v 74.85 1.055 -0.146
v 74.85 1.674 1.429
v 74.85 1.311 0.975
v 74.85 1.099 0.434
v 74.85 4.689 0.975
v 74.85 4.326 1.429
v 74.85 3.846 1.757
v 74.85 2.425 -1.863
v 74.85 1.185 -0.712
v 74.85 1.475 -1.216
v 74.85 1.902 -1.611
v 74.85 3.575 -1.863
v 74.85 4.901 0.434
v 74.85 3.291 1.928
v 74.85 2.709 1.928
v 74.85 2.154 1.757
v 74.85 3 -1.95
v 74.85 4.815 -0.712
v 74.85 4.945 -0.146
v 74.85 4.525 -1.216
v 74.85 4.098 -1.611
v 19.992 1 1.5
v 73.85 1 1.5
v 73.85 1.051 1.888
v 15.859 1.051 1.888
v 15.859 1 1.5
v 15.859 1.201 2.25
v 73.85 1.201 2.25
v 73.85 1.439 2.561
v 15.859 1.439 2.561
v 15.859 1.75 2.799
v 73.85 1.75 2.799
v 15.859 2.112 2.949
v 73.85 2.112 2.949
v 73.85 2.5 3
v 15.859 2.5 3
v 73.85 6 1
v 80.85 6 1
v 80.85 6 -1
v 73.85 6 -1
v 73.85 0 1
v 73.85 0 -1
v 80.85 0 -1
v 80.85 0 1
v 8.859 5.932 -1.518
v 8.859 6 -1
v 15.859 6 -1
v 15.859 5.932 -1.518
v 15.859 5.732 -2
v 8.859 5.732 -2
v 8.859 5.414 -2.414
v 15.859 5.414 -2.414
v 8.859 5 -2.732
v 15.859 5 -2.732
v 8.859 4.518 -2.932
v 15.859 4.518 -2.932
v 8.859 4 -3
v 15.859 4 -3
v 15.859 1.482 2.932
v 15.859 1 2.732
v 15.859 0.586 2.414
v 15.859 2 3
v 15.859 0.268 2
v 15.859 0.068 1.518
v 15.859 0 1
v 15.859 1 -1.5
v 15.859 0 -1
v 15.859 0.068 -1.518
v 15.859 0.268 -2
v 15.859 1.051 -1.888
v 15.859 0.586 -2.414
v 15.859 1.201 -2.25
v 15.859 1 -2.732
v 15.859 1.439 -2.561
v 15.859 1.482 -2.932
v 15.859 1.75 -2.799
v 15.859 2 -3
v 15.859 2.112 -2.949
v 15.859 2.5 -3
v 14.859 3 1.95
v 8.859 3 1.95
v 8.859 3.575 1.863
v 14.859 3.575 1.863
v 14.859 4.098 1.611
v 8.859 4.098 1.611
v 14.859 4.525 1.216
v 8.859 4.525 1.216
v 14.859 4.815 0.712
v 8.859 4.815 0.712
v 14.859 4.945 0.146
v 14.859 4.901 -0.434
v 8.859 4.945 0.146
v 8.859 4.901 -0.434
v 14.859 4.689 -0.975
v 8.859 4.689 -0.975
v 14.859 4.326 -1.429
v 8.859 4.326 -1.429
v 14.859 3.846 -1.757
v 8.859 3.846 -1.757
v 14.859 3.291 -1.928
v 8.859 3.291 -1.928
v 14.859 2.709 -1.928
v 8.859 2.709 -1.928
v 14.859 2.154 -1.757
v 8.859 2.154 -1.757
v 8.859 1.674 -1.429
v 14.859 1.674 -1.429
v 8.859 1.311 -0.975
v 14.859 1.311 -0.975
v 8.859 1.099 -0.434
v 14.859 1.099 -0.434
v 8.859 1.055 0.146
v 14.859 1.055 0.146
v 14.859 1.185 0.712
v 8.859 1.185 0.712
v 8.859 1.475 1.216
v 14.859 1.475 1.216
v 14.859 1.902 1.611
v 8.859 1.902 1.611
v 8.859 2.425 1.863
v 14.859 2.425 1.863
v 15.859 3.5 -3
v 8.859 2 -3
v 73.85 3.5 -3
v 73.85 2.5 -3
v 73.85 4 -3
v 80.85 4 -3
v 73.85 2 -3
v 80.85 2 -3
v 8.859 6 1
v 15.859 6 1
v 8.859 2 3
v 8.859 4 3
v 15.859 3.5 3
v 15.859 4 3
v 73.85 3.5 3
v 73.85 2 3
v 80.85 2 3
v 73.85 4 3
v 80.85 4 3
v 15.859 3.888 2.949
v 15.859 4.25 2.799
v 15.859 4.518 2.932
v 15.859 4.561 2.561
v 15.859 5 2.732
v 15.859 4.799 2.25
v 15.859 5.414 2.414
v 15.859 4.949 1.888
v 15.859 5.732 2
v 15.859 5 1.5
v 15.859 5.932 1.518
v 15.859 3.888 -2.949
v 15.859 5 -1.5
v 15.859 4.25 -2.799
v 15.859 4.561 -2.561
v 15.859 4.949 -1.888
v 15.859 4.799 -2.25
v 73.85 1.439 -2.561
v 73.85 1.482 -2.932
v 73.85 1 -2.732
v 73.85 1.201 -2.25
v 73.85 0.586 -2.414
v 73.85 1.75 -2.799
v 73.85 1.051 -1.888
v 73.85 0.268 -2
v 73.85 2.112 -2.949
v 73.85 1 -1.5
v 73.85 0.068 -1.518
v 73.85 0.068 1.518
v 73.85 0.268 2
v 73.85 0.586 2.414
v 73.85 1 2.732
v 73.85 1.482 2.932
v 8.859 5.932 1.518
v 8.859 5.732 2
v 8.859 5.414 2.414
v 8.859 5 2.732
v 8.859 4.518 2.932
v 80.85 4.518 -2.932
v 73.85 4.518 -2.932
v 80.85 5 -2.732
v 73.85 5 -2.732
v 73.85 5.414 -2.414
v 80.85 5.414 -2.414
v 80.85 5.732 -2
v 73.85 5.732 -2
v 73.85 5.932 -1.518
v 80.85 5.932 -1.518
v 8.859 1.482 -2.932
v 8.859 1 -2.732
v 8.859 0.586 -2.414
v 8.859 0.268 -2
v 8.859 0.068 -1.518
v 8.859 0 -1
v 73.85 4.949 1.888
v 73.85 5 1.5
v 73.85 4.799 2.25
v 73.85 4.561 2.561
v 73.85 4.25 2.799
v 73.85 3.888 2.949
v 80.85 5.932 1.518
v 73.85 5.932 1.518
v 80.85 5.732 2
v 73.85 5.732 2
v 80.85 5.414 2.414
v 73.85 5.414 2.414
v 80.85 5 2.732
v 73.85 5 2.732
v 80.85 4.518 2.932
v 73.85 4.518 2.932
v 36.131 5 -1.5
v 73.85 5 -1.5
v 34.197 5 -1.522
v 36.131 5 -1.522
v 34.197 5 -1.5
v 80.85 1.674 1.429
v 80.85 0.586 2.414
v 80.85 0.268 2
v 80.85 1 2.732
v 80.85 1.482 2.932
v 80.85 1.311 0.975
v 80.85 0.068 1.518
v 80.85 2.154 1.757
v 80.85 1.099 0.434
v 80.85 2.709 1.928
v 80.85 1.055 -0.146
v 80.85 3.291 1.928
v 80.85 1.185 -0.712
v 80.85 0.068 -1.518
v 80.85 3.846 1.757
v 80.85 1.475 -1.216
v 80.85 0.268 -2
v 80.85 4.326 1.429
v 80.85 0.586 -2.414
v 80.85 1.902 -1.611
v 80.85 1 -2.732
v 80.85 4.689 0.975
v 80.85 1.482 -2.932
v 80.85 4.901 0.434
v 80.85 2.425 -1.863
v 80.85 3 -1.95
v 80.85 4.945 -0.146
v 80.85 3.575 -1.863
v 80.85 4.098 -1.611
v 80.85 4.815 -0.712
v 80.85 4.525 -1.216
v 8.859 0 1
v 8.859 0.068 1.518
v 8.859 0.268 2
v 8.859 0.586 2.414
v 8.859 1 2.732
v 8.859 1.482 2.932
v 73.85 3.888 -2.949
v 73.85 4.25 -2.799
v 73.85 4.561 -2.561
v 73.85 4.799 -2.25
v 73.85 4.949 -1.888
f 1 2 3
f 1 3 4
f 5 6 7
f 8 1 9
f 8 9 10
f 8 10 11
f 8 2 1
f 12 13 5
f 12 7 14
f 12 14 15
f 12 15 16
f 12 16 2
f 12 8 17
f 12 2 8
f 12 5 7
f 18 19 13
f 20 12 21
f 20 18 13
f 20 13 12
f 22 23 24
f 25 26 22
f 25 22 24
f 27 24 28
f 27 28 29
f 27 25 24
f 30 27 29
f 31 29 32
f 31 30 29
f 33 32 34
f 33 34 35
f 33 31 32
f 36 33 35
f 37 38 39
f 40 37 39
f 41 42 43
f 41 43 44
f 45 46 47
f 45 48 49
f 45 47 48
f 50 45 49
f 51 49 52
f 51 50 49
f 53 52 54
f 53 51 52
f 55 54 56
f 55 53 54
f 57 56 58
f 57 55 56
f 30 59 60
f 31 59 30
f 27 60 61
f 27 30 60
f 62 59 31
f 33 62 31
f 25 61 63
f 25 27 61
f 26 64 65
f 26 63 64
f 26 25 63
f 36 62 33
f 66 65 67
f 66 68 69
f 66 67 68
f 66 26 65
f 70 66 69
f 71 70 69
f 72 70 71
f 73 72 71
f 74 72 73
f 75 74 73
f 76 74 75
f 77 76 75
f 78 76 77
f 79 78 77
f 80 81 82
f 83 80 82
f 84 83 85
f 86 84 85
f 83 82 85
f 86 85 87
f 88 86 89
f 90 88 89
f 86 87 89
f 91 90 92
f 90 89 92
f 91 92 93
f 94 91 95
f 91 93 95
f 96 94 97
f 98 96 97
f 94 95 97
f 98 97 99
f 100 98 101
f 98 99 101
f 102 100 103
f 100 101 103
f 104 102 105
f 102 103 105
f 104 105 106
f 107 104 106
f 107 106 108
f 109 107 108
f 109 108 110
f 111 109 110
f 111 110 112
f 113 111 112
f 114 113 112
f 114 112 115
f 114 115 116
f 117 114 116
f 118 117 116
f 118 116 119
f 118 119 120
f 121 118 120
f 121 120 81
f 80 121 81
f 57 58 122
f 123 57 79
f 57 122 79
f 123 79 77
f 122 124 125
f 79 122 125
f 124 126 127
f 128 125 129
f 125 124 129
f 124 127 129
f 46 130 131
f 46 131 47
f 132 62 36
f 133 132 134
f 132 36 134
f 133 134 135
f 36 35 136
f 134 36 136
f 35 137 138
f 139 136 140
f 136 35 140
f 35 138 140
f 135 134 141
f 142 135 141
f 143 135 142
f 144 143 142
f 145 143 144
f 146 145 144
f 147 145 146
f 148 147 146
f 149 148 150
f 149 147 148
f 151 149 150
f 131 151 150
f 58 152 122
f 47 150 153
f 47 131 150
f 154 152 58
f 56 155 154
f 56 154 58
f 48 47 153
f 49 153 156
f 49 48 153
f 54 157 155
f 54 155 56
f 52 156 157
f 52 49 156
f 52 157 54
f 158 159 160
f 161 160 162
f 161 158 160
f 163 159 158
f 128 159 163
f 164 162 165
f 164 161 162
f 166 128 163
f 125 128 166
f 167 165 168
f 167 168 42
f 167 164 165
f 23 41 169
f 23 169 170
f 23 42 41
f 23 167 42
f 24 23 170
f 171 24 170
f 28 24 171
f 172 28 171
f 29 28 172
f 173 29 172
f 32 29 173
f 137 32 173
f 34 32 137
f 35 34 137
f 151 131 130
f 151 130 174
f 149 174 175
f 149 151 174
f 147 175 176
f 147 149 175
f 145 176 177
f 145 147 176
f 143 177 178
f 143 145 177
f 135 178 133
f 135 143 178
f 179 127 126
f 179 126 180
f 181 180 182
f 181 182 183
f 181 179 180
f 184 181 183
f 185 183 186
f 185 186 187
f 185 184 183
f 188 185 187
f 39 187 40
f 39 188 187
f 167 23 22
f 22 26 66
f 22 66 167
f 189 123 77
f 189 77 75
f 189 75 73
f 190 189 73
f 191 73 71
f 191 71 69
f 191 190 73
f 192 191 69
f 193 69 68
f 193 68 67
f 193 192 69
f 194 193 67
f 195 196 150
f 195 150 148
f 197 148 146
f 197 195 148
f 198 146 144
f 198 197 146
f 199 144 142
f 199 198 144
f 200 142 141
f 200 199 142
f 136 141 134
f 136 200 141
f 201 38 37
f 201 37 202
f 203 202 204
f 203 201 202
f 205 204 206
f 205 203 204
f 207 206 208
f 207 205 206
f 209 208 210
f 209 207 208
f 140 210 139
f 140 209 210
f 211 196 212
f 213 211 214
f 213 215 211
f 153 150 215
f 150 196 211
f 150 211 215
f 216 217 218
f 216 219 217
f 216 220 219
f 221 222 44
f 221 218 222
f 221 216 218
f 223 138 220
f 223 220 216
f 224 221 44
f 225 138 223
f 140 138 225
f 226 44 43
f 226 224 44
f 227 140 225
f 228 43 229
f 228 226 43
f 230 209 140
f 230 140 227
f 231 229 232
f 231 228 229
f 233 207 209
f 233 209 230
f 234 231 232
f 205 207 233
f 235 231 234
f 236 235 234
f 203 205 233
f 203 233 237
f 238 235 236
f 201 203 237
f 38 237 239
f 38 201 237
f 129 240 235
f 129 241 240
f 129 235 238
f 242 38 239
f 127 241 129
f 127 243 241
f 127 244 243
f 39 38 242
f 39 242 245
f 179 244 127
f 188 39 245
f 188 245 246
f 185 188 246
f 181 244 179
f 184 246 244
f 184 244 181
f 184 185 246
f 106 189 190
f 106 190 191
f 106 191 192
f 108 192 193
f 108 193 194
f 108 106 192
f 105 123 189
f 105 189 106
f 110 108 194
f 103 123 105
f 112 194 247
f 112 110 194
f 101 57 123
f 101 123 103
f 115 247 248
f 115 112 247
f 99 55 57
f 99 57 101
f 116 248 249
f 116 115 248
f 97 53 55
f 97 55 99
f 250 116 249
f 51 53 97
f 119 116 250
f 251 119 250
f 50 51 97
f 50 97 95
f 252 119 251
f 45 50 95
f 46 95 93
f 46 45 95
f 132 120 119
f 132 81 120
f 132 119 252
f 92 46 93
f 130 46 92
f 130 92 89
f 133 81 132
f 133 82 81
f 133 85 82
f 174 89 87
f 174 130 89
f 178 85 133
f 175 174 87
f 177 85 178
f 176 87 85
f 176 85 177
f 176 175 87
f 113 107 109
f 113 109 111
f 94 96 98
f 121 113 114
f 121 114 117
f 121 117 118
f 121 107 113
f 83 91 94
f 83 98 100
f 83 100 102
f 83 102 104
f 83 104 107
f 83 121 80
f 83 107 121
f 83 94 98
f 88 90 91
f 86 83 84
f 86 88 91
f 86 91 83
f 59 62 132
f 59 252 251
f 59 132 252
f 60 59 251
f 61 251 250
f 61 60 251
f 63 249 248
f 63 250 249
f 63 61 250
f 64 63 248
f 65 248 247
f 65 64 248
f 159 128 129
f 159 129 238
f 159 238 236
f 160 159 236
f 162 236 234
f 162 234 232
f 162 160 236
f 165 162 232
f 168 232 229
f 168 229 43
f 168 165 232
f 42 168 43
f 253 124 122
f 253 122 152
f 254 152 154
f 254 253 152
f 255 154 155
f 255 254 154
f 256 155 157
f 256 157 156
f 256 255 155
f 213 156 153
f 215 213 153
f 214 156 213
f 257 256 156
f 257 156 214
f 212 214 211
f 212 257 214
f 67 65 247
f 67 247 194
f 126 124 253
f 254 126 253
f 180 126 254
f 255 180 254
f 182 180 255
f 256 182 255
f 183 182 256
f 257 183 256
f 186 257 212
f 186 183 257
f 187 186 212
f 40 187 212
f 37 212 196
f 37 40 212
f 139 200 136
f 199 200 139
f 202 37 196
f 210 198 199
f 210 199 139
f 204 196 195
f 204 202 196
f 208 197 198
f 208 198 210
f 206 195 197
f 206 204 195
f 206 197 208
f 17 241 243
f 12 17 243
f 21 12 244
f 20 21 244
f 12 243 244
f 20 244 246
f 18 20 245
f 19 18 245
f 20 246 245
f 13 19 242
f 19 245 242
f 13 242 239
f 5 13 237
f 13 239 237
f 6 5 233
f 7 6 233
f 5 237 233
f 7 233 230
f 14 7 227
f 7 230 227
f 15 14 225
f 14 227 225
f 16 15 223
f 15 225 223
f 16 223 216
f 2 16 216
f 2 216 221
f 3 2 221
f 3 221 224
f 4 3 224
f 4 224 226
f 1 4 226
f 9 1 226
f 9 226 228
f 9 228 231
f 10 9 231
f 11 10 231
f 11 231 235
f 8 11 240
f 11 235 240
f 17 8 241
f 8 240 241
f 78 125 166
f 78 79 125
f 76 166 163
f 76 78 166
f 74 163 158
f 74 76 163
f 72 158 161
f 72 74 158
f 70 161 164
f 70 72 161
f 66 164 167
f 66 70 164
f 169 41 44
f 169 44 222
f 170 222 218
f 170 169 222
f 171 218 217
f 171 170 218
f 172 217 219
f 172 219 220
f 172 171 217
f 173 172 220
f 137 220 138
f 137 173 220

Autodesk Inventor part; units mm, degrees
ref_plane "YZ Plane" through (0, 0, 0) normal (1, 0, 0) x (0, 1, 0)
ref_plane "XZ Plane" through (0, 0, 0) normal (0, 1, 0) x (-1, 0, 0)
ref_plane "XY Plane" through (0, 0, 0) normal (0, 0, 1) x (1, 0, 0)
sketch "Sketch1" plane through (0, 0, 0) normal (0, 1, 0) x (-1, 0, 0)
  point P0 (0, 0)
sketch "Sketch2" plane through (0, 0, 0) normal (0, 1, 0) x (-1, 0, 0)
  circle A0 centre (0, 0) radius 3.85
  dimension "d0" = 7.7
extrude "Extrusion1" add sketch "Sketch2" along normal blind 6
sketch "Sketch3" plane through (0, 6, 0) normal (0, 1, 0) x (1, 0, 0)
  circle A0 centre (0, 0) radius 1
  dimension "d3" = 2
extrude "Extrusion2" cut sketch "Sketch3" against normal through all
sketch "Sketch4" plane through (0, 0, 0) normal (0, -1, 0) x (1, 0, 0)
  circle A0 centre (0, 0) radius 3.85 projected
  line L0 (0, 3.85) -> (3.85, 3.85)
  line L1 (3.85, 3.85) -> (3.85, -3.85)
  line L2 (3.85, -3.85) -> (0, -3.85)
  line L3 (3.85, 3.85) -> (4.85, 3.85)
  line L4 (4.85, 3.85) -> (4.85, -3.85)
  line L5 (4.85, -3.85) -> (3.85, -3.85)
  line L6 (3.85, -3.85) -> (3.85, 3.85)
  line L7 (4.85, 3.85) -> (4.85, 3)
  line L8 (4.85, -3.85) -> (4.85, -3)
  line L9 (4.85, 3) -> (3.85, 3)
  line L10 (3.85, 3) -> (3.85, -3)
  line L11 (3.85, -3) -> (4.85, -3)
  line L12 (4.85, -3) -> (4.85, 3)
  point P0 (3.85, -3)
  dimension "d6" = 1
  dimension "d7" = 0.85
  dimension "d8" = 0.85
extrude "Extrusion3" add sketch "Sketch4" against normal blind 6 contours L1 L9 L4 L11
sketch "Sketch5" plane through (4.85, 0, 3) normal (1, 0, 0) x (0, 0, -1)
  line L0 (6.85, 0) -> (-0.85, 0) projected
  line L1 (6, 0) -> (6, 6) projected
  line L2 (0.0003, 0) -> (6, 0)
  line L3 (6, 0) -> (6, 1)
  line L4 (6, 1) -> (0.0003, 1)
  line L5 (0.0003, 1) -> (0.0003, 0)
  line L6 (6.85, 6) -> (-0.85, 6) projected
  line L7 (0.0003, 6) -> (6, 6)
  line L8 (6, 6) -> (6, 5)
  line L9 (6, 5) -> (0.0003, 5)
  line L10 (0.0003, 5) -> (0.0003, 6)
  point P0 (3, 0)
  point P1 (3, 6)
  dimension "d11" = 1
  dimension "d12" = 1
extrude "Extrusion4" cut sketch "Sketch5" against normal blind 1 contours L9 L10 L6 L1
extrude "Extrusion5" cut sketch "Sketch5" against normal blind 1 contours L0 L5 L4 L1
sketch "Sketch6" plane through (4.85, 5, 2.9997) normal (0, 0, -1) x (-1, 0, 0)
  line L0 (0, 0) -> (1, 0) projected
  line L1 (0, -5) -> (0, 1) projected
  line L2 (1, 0) -> (0, 0)
  line L3 (0, 0) -> (0, 1)
  line L4 (0, 1) -> (1, 1)
  line L5 (1, 1) -> (1, 0)
  line L6 (1, -5) -> (0, -5)
  line L7 (0, -5) -> (0, -3.9916)
  line L8 (0, -3.9916) -> (1, -3.9916)
  line L9 (1, -3.9916) -> (1, -5)
  point P0 (4.85, -5)
extrude "Extrusion6" cut sketch "Sketch6" against normal through all contours L1 L4 L5 L0
extrude "Extrusion7" cut sketch "Sketch6" against normal through all contours L1 L8 L9 L6
sketch "Sketch7" plane through (4.85, 5, 3) normal (1, 0, 0) x (0, 0, -1)
  line L0 (0, 0) -> (3, 0) projected
  line L1 (6, -4) -> (6, 0) projected
  line L2 (0, 0) -> (6, 0)
  line L3 (6, 0) -> (6, -4)
  line L4 (6, -4) -> (0, -4)
  line L5 (0, -4) -> (0, 0)
  point P0 (3, -5)
extrude "Extrusion8" add sketch "Sketch7" along normal blind 71
sketch "Sketch8" plane through (3.85, 1, -3) normal (0, 0, -1) x (-1, 0, 0)
  point P0 (3.85, -1)
sketch "Sketch9" plane through (3.85, 5, 0) normal (0, 1, 0) x (1, 0, 0)
  line L0 (72, 3) -> (72, -3) projected
  line L1 (72, 0) -> (75.85, 0)
  circle A0 centre (75.85, 0) radius 3.85
  point P0 (-3.85, 0)
  dimension "d23" = 3.85
extrude "Extrusion9" add sketch "Sketch9" along normal blind 1
extrude "Extrusion10" add sketch "Sketch9" against normal blind 5
sketch "Sketch10" plane through (79.7, 6, 0) normal (0, 1, 0) x (1, 0, 0)
  circle A0 centre (0, 0) radius 1.85
  point P0 (-79.7, 0)
  dimension "d28" = 3.7
extrude "Extrusion11" cut sketch "Sketch10" against normal through all
sketch "Sketch11" plane through (3.85, 5, 0) normal (-1, 0, 0) x (0, 0, 1)
  point P0 (0, -5)
sketch "Sketch12" plane through (3.85, 5, -3) normal (-1, 0, 0) x (0, 0, 1)
  line L0 (0, 0) -> (3, 0) projected
  line L1 (6, 0) -> (6, -4) projected
  line L2 (0, 0) -> (6, 0)
  line L3 (6, 0) -> (6, -4)
  line L4 (6, -4) -> (0, -4)
  line L5 (0, -4) -> (0, 0)
  point P0 (3, -5)
extrude "Extrusion12" add sketch "Sketch12" along normal blind 2
sketch "Sketch13" plane through (75.85, 5, 3) normal (1, 0, 0) x (0, 0, -1)
  line L0 (3, 0) -> (0, 0) projected
  line L1 (3, -4) -> (6, -4) projected
  line L2 (0, 0) -> (6, 0)
  line L3 (6, 0) -> (6, -4)
  line L4 (6, -4) -> (0, -4)
  line L5 (0, -4) -> (0, 0)
  point P0 (3, -5)
extrude "Extrusion13" add sketch "Sketch13" along normal blind 1.6
fillet "Fillet1" radius 1.5 2 edges at (76.5685, 5, 3) (39.1315, 5, 3)
fillet "Fillet2" radius 1.5 1 edges at (39.85, 5, -3)
fillet "Fillet3" radius 1.5 1 edges at (39.85, 1, -3)
fillet "Fillet4" radius 1.5 3 edges at (4.35, 1, 2.9997) (40.35, 1, 3) (4.85, 1, 2.9998)
sketch "Sketch14" plane through (3.5458, 5, 1.5) normal (0, 1, 0) x (1, 0, 0)
  point P0 (-3.5458, 1.5)
sketch "Sketch15" plane through (3.5458, 5, 1.5) normal (0, 1, 0) x (1, 0, 0)
  line L0 (0.4177, 2.9988) -> (2.9717, 2.9988) construction
  line L1 (2.9717, 2.9988) -> (2.9717, -0.0492) construction
  line L2 (2.9717, -0.0492) -> (0.4177, -0.0492) construction
  line L3 (0.4177, -0.0492) -> (0.4177, 2.9988) construction
  line L4 (0.398, -0.0492) -> (1.4255, 2.9988)
  line L5 (1.4255, 2.9988) -> (1.9244, 2.9988)
  line L6 (1.9244, 2.9988) -> (2.952, -0.0492)
  line L7 (2.952, -0.0492) -> (2.5247, -0.0492)
  line L8 (2.5247, -0.0492) -> (2.248, 0.803)
  line L9 (2.248, 0.803) -> (1.0846, 0.803)
  line L10 (1.0846, 0.803) -> (0.808, -0.0492)
  line L11 (0.808, -0.0492) -> (0.398, -0.0492)
  line L12 (2.1369, 1.1488) -> (1.6651, 2.5839)
  line L13 (1.6651, 2.5839) -> (1.1958, 1.1488)
  line L14 (1.1958, 1.1488) -> (2.1369, 1.1488)
  point P0 (-3.5458, 1.5)
extrude "Extrusion14" add sketch "Sketch15" along normal blind 0.2
sketch "Sketch16" plane through (3.5458, 5, -1.5) normal (0, 1, 0) x (1, 0, 0)
  line L0 (69.8363, -0.0038) -> (72.3064, -0.0038) construction
  line L1 (72.3064, -0.0038) -> (72.3064, -3.0518) construction
  line L2 (72.3064, -3.0518) -> (69.8363, -3.0518) construction
  line L3 (69.8363, -3.0518) -> (69.8363, -0.0038) construction
  spline S0 degree 2 poles (72.2125, -2.1157) (72.2125, -2.3429) (72.0396, -2.6912) (71.8963, -2.8048) knots 0 0 0 1 2 2 2
  spline S1 degree 2 poles (71.8963, -2.8048) (71.7234, -2.9382) (71.3307, -3.0518) (71.0195, -3.0518) knots 0 0 0 1 2 2 2
  line L4 (71.0195, -3.0518) -> (70.1451, -3.0518)
  line L5 (70.1451, -3.0518) -> (70.1451, -0.0038)
  line L6 (70.1451, -0.0038) -> (70.9528, -0.0038)
  spline S2 degree 2 poles (70.9528, -0.0038) (71.2788, -0.0038) (71.6049, -0.0458) (71.7531, -0.1273) knots 0 0 0 1 2 2 2
  spline S3 degree 2 poles (71.7531, -0.1273) (71.9186, -0.2138) (72.0692, -0.4978) (72.0692, -0.6905) knots 0 0 0 1 2 2 2
  spline S4 degree 2 poles (72.0692, -0.6905) (72.0692, -0.9054) (71.842, -1.2462) (71.6419, -1.3426) knots 0 0 0 1 2 2 2
  line L7 (71.6419, -1.3426) -> (71.6419, -1.3574)
  spline S5 degree 2 poles (71.6419, -1.3574) (71.9136, -1.4315) (72.2125, -1.8242) (72.2125, -2.1157) knots 0 0 0 1 2 2 2
  spline S6 degree 2 poles (71.7901, -2.133) (71.7901, -1.9601) (71.6913, -1.7378) (71.5431, -1.6587) knots 0 0 0 1 2 2 2
  spline S7 degree 2 poles (71.5431, -1.6587) (71.4468, -1.6093) (71.2195, -1.5797) (71.0096, -1.5797) knots 0 0 0 1 2 2 2
  line L8 (71.0096, -1.5797) -> (70.5502, -1.5797)
  line L9 (70.5502, -1.5797) -> (70.5502, -2.706)
  line L10 (70.5502, -2.706) -> (70.8787, -2.706)
  spline S8 degree 2 poles (70.8787, -2.706) (71.1454, -2.706) (71.4517, -2.6566) (71.5703, -2.5776) knots 0 0 0 1 2 2 2
  spline S9 degree 2 poles (71.5703, -2.5776) (71.6839, -2.4961) (71.7901, -2.2935) (71.7901, -2.133) knots 0 0 0 1 2 2 2
  spline S10 degree 2 poles (71.6469, -0.7473) (71.6469, -0.6386) (71.5728, -0.4756) (71.4912, -0.4287) knots 0 0 0 1 2 2 2
  spline S11 degree 2 poles (71.4912, -0.4287) (71.3924, -0.3743) (71.1529, -0.3496) (70.938, -0.3496) knots 0 0 0 1 2 2 2
  line L11 (70.938, -0.3496) -> (70.5502, -0.3496)
  line L12 (70.5502, -0.3496) -> (70.5502, -1.2413)
  line L13 (70.5502, -1.2413) -> (71.0096, -1.2413)
  spline S12 degree 2 poles (71.0096, -1.2413) (71.1998, -1.2413) (71.3801, -1.2018) (71.4764, -1.14) knots 0 0 0 1 2 2 2
  spline S13 degree 2 poles (71.4764, -1.14) (71.5703, -1.0807) (71.6469, -0.8905) (71.6469, -0.7473) knots 0 0 0 1 2 2 2
  point P0 (-3.5458, -1.5)
extrude "Extrusion15" add sketch "Sketch16" along normal blind 0.2
sketch "Sketch17" plane through (3.5458, 5, -1.5) normal (0, 1, 0) x (1, 0, 0)
  line L0 (0.4145, -1.5) -> (36.4145, -1.5)
  line L1 (30.4487, 0.0859) -> (55.6072, 0.0859) construction
  line L2 (55.6072, 0.0859) -> (55.6072, -2.5363) construction
  line L3 (55.6072, -2.5363) -> (30.4487, -2.5363) construction
  line L4 (30.4487, -2.5363) -> (30.4487, 0.0859) construction
  line L5 (32.5853, -0.4353) -> (31.2663, -3.0264)
  line L6 (31.2663, -3.0264) -> (30.8316, -3.0264)
  line L7 (30.8316, -3.0264) -> (32.2247, -0.3365)
  line L8 (32.2247, -0.3365) -> (30.6513, -0.3365)
  line L9 (30.6513, -0.3365) -> (30.6513, 0.0216)
  line L10 (30.6513, 0.0216) -> (32.5853, 0.0216)
  line L11 (32.5853, 0.0216) -> (32.5853, -0.4353)
  line L12 (34.838, -3.0264) -> (32.9583, -3.0264)
  line L13 (32.9583, -3.0264) -> (32.9583, -2.5941)
  spline S0 degree 2 poles (32.9583, -2.5941) (33.1608, -2.4039) (33.5214, -2.0507) (33.6943, -1.8605) knots 0 0 0 1 2 2 2
  spline S1 degree 2 poles (33.6943, -1.8605) (34.0426, -1.4777) (34.297, -1.0182) (34.297, -0.7737) knots 0 0 0 1 2 2 2
  spline S2 degree 2 poles (34.297, -0.7737) (34.297, -0.6453) (34.218, -0.4526) (34.1464, -0.3909) knots 0 0 0 1 2 2 2
  spline S3 degree 2 poles (34.1464, -0.3909) (34.0747, -0.3291) (33.887, -0.2674) (33.7734, -0.2674) knots 0 0 0 1 2 2 2
  spline S4 degree 2 poles (33.7734, -0.2674) (33.6647, -0.2674) (33.4424, -0.3217) (33.3411, -0.3637) knots 0 0 0 1 2 2 2
  spline S5 degree 2 poles (33.3411, -0.3637) (33.2547, -0.3983) (33.0941, -0.4971) (33.0447, -0.5317) knots 0 0 0 1 2 2 2
  line L14 (33.0447, -0.5317) -> (33.0225, -0.5317)
  line L15 (33.0225, -0.5317) -> (33.0225, -0.0969)
  spline S6 degree 2 poles (33.0225, -0.0969) (33.1485, -0.0352) (33.6005, 0.0859) (33.803, 0.0859) knots 0 0 0 1 2 2 2
  spline S7 degree 2 poles (33.803, 0.0859) (34.2303, 0.0859) (34.712, -0.3662) (34.712, -0.7515) knots 0 0 0 1 2 2 2
  spline S8 degree 2 poles (34.712, -0.7515) (34.712, -0.9318) (34.628, -1.2331) (34.5539, -1.3616) knots 0 0 0 1 2 2 2
  spline S9 degree 2 poles (34.5539, -1.3616) (34.4798, -1.495) (34.2649, -1.7568) (34.1464, -1.8828) knots 0 0 0 1 2 2 2
  spline S10 degree 2 poles (34.1464, -1.8828) (33.9537, -2.0927) (33.4819, -2.5422) (33.3411, -2.6732) knots 0 0 0 1 2 2 2
  line L16 (33.3411, -2.6732) -> (34.838, -2.6732)
  line L17 (34.838, -2.6732) -> (34.838, -3.0264)
  line L18 (37.8958, -3.0264) -> (37.8958, -1.7024)
  spline S11 degree 2 poles (37.8958, -1.7024) (37.8958, -1.5444) (37.8711, -1.2751) (37.8316, -1.201) knots 0 0 0 1 2 2 2
  spline S12 degree 2 poles (37.8316, -1.201) (37.7921, -1.1195) (37.6414, -1.0405) (37.5105, -1.0405) knots 0 0 0 1 2 2 2
  spline S13 degree 2 poles (37.5105, -1.0405) (37.392, -1.0405) (37.1203, -1.1862) (36.977, -1.3245) knots 0 0 0 1 2 2 2
  spline S14 degree 2 poles (36.977, -1.3245) (36.9795, -1.3591) (36.9844, -1.4554) (36.9844, -1.5197) knots 0 0 0 1 2 2 2
  line L19 (36.9844, -1.5197) -> (36.9844, -3.0264)
  line L20 (36.9844, -3.0264) -> (36.5991, -3.0264)
  line L21 (36.5991, -3.0264) -> (36.5991, -1.7024)
  spline S15 degree 2 poles (36.5991, -1.7024) (36.5991, -1.5444) (36.5744, -1.2751) (36.5349, -1.201) knots 0 0 0 1 2 2 2
  spline S16 degree 2 poles (36.5349, -1.201) (36.4953, -1.1195) (36.3447, -1.0405) (36.2138, -1.0405) knots 0 0 0 1 2 2 2
  spline S17 degree 2 poles (36.2138, -1.0405) (36.0903, -1.0405) (35.8161, -1.1961) (35.6876, -1.3171) knots 0 0 0 1 2 2 2
  line L22 (35.6876, -1.3171) -> (35.6876, -3.0264)
  line L23 (35.6876, -3.0264) -> (35.3023, -3.0264)
  line L24 (35.3023, -3.0264) -> (35.3023, -0.7391)
  line L25 (35.3023, -0.7391) -> (35.6876, -0.7391)
  line L26 (35.6876, -0.7391) -> (35.6876, -0.9911)
  spline S18 degree 2 poles (35.6876, -0.9911) (35.8383, -0.8404) (36.1347, -0.6749) (36.3126, -0.6749) knots 0 0 0 1 2 2 2
  spline S19 degree 2 poles (36.3126, -0.6749) (36.5151, -0.6749) (36.8288, -0.8602) (36.9103, -1.0701) knots 0 0 0 1 2 2 2
  spline S20 degree 2 poles (36.9103, -1.0701) (37.0857, -0.875) (37.4167, -0.6749) (37.6093, -0.6749) knots 0 0 0 1 2 2 2
  spline S21 degree 2 poles (37.6093, -0.6749) (37.7575, -0.6749) (37.9996, -0.7663) (38.0885, -0.87) knots 0 0 0 1 2 2 2
  spline S22 degree 2 poles (38.0885, -0.87) (38.1799, -0.9738) (38.2812, -1.285) (38.2812, -1.5197) knots 0 0 0 1 2 2 2
  line L27 (38.2812, -1.5197) -> (38.2812, -3.0264)
  line L28 (38.2812, -3.0264) -> (37.8958, -3.0264)
  line L29 (41.4156, -3.0264) -> (41.4156, -1.7024)
  spline S23 degree 2 poles (41.4156, -1.7024) (41.4156, -1.5444) (41.3909, -1.2751) (41.3514, -1.201) knots 0 0 0 1 2 2 2
  spline S24 degree 2 poles (41.3514, -1.201) (41.3119, -1.1195) (41.1612, -1.0405) (41.0303, -1.0405) knots 0 0 0 1 2 2 2
  spline S25 degree 2 poles (41.0303, -1.0405) (40.9117, -1.0405) (40.64, -1.1862) (40.4968, -1.3245) knots 0 0 0 1 2 2 2
  spline S26 degree 2 poles (40.4968, -1.3245) (40.4992, -1.3591) (40.5042, -1.4554) (40.5042, -1.5197) knots 0 0 0 1 2 2 2
  line L30 (40.5042, -1.5197) -> (40.5042, -3.0264)
  line L31 (40.5042, -3.0264) -> (40.1189, -3.0264)
  line L32 (40.1189, -3.0264) -> (40.1189, -1.7024)
  spline S27 degree 2 poles (40.1189, -1.7024) (40.1189, -1.5444) (40.0942, -1.2751) (40.0546, -1.201) knots 0 0 0 1 2 2 2
  spline S28 degree 2 poles (40.0546, -1.201) (40.0151, -1.1195) (39.8644, -1.0405) (39.7335, -1.0405) knots 0 0 0 1 2 2 2
  spline S29 degree 2 poles (39.7335, -1.0405) (39.61, -1.0405) (39.3359, -1.1961) (39.2074, -1.3171) knots 0 0 0 1 2 2 2
  line L33 (39.2074, -1.3171) -> (39.2074, -3.0264)
  line L34 (39.2074, -3.0264) -> (38.8221, -3.0264)
  line L35 (38.8221, -3.0264) -> (38.8221, -0.7391)
  line L36 (38.8221, -0.7391) -> (39.2074, -0.7391)
  line L37 (39.2074, -0.7391) -> (39.2074, -0.9911)
  spline S30 degree 2 poles (39.2074, -0.9911) (39.3581, -0.8404) (39.6545, -0.6749) (39.8323, -0.6749) knots 0 0 0 1 2 2 2
  spline S31 degree 2 poles (39.8323, -0.6749) (40.0349, -0.6749) (40.3486, -0.8602) (40.4301, -1.0701) knots 0 0 0 1 2 2 2
  spline S32 degree 2 poles (40.4301, -1.0701) (40.6054, -0.875) (40.9364, -0.6749) (41.1291, -0.6749) knots 0 0 0 1 2 2 2
  spline S33 degree 2 poles (41.1291, -0.6749) (41.2773, -0.6749) (41.5194, -0.7663) (41.6083, -0.87) knots 0 0 0 1 2 2 2
  spline S34 degree 2 poles (41.6083, -0.87) (41.6997, -0.9738) (41.8009, -1.285) (41.8009, -1.5197) knots 0 0 0 1 2 2 2
  line L38 (41.8009, -1.5197) -> (41.8009, -3.0264)
  line L39 (41.8009, -3.0264) -> (41.4156, -3.0264)
  point P0 (-3.5458, -1.5)
  dimension "d43" = 36
extrude "Extrusion16" add sketch "Sketch17" along normal blind 0.2
sketch "Sketch18" plane through (3.5458, 5.2, -1.5) normal (0, 1, 0) x (1, 0, 0)
  line L0 (29.8828, 2.0952) -> (43.3392, 2.0952)
  line L1 (43.3392, 2.0952) -> (43.3392, -5.5663)
  line L2 (43.3392, -5.5663) -> (29.8828, -5.5663)
  line L3 (29.8828, -5.5663) -> (29.8828, 2.0952)
  point P0 (-3.5458, -1.5)
extrude "Extrusion17" cut sketch "Sketch18" against normal blind 0.2
sketch "Sketch19" plane through (3.5458, 5.2, 1.5) normal (0, 1, 0) x (1, 0, 0)
  line L0 (0.3624, -0.1736) -> (3.3783, -0.1736)
  line L1 (3.3783, -0.1736) -> (3.3783, 3.2897)
  line L2 (3.3783, 3.2897) -> (0.3624, 3.2897)
  line L3 (0.3624, 3.2897) -> (0.3624, -0.1736)
  line L4 (72.2697, -0.5369) -> (69.8008, -0.5369)
  line L5 (69.8008, -0.5369) -> (69.8008, 3.7021)
  line L6 (69.8008, 3.7021) -> (72.2697, 3.7021)
  line L7 (72.2697, 3.7021) -> (72.2697, -0.5369)
  point P0 (-3.5458, 1.5)
extrude "Extrusion18" cut sketch "Sketch19" against normal blind 0.2 contours L3 L2 L1 L0
extrude "Extrusion19" cut sketch "Sketch19" against normal blind 0.2 contours L4 L5 L6 L7
sketch "Sketch20" plane through (79.7, 0, 0) normal (0, -1, 0) x (1, 0, 0)
  point P0 (-79.7, 0)
sketch "Sketch21" plane through (79.7, 6, 0) normal (0, 1, 0) x (1, 0, 0)
  circle A0 centre (0, 0) radius 1.95
  point P0 (-79.7, 0)
  dimension "d52" = 3.9
extrude "Extrusion20" cut sketch "Sketch21" against normal through all
sketch "Sketch22" plane through (0, 6, 0) normal (0, 1, 0) x (1, 0, 0)
  line L0 (0, 0) -> (0, -3.85)
  circle A0 centre (0, 0) radius 3.85 projected
  line L1 (0, -3.85) -> (3.85, -3.85)
  line L2 (3.85, -3.85) -> (-3.85, -3.85)
  line L3 (-3.85, -3.85) -> (-3.85, 3.85)
  line L4 (-3.85, 3.85) -> (3.85, 3.85)
  line L5 (3.85, 3.85) -> (3.85, -3.85)
extrude "Extrusion21" cut sketch "Sketch22" against normal through all contours A0
sketch "Sketch23" plane through (79.7, 5, 0) normal (0, 1, 0) x (1, 0, 0)
  arc A0 (-76.1542, -1.5) -> (-76.1542, 1.5) centre (-79.7, 0) ccw projected
  line L0 (-75.85, 0) -> (-77.9753, 0)
  line L1 (-77.9753, 0) -> (-77.9753, 3.5992)
  line L2 (-77.9753, 3.5992) -> (-75.85, 3.5992)
  line L3 (-75.85, 3.5992) -> (-75.85, 0)
  line L4 (-75.85, 0) -> (-77.9753, 0)
  line L5 (-77.9753, 0) -> (-77.9753, -3.4561)
  line L6 (-77.9753, -3.4561) -> (-75.85, -3.4561)
  line L7 (-75.85, -3.4561) -> (-75.85, 0)
  line L8 (-75.85, -3.4561) -> (-65.85, -3.4561)
  line L9 (-65.85, -3.4561) -> (-65.85, 3.5992)
  line L10 (-65.85, 3.5992) -> (-75.85, 3.5992)
  line L11 (-75.85, 3.5992) -> (-75.85, -3.4561)
  dimension "d57" = 10
extrude "Extrusion22" cut sketch "Sketch23" against normal through all contours L3 L10 L9 L8 L7
extrude "Extrusion23" cut sketch "Sketch23" against normal through all contours L7 L6 L5 L0
extrude "Extrusion24" cut sketch "Sketch23" against normal through all contours L0 L1 L2 L3
sketch "Sketch24" plane through (13.85, 5, -1.5) normal (-1, 0, 0) x (0, 0, 1)
  line L0 (-2.9013, -5) -> (5.7799, -5)
  line L1 (5.7799, -5) -> (5.7799, 1.344)
  line L2 (5.7799, 1.344) -> (-2.9013, 1.344)
  line L3 (-2.9013, 1.344) -> (-2.9013, -5)
  point P0 (1.5, -5)
extrude "Extrusion25" cut sketch "Sketch24" against normal blind 6.142
sketch "Sketch25" plane through (19.992, 5, -1.5) normal (-1, 0, 0) x (0, 0, 1)
  line L0 (-1.5, 0) -> (4.5, 0)
  line L1 (4.5, 0) -> (4.5, -4)
  line L2 (4.5, -4) -> (-1.5, -4)
  line L3 (-1.5, -4) -> (-1.5, 0)
  point P0 (1.5, -5)
  dimension "d66" = 6
  dimension "d67" = 4
extrude "Extrusion26" add sketch "Sketch25" along normal blind 6.133
sketch "Sketch26" plane through (79.7, 6, 0) normal (0, 1, 0) x (1, 0, 0)
  line L0 (-65.841, -3) -> (-65.841, 3) projected
  line L1 (-65.841, 0) -> (-69.691, 0)
  circle A0 centre (-69.691, 0) radius 3.85
  point P0 (-79.7, 0)
  dimension "d70" = 3.85
extrude "Extrusion27" add sketch "Sketch26" against normal blind 6
sketch "Sketch27" plane through (13.859, 5, -1.5) normal (-1, 0, 0) x (0, 0, 1)
  point P0 (1.5, -5)
sketch "Sketch28" plane through (13.859, 5, -1.5) normal (-1, 0, 0) x (0, 0, 1)
  line L0 (-1.5, 0) -> (-1.5, -4) projected
  line L1 (4.5, 0) -> (3, 0) projected
  line L2 (-1.5, -4) -> (4.5, -4)
  line L3 (4.5, -4) -> (4.5, 0)
  line L4 (4.5, 0) -> (-1.5, 0)
  line L5 (-1.5, 0) -> (-1.5, -4)
  point P0 (1.5, -5)
extrude "Extrusion28" add sketch "Sketch28" along normal blind 5
sketch "Sketch29" plane through (19.992, 3.5, 3) normal (0, 0, 1) x (1, 0, 0)
  point P0 (-19.992, -3.5)
sketch "Sketch30" plane through (79.7, 5, 0) normal (0, 1, 0) x (1, 0, 0)
  point P0 (-79.7, 0)
sketch "Sketch31" plane through (19.992, 5, -1.5) normal (1, 0, 0) x (0, 0, -1)
  arc A0 (-3, 0) -> (-4.5, -1.5) centre (-3, -1.5) ccw projected
  circle A1 centre (-3, -1.5) radius 1.5
  circle A2 centre (-3, -1.5) radius 1.5
  arc A3 (-4.5, -2.5) -> (-3, -4) centre (-3, -2.5) ccw projected
  circle A4 centre (-3, -2.5) radius 1.5
  arc A5 (0, -4) -> (1.5, -2.5) centre (0, -2.5) ccw projected
  circle A6 centre (0, -2.5) radius 1.5
  arc A7 (1.5, -1.5) -> (0, 0) centre (0, -1.5) ccw projected
  circle A8 centre (0, -1.5) radius 1.5
  line L0 (-4.5, -1.5) -> (-4.5, 0) projected
  line L1 (-4.5, 0) -> (-3, 0)
  line L2 (-3, 0) -> (-3, -1.5)
  line L3 (-3, -1.5) -> (-4.5, -1.5)
  line L4 (-4.5, -1.5) -> (-4.5, 0)
  line L5 (0, 0) -> (1.5, 0)
  line L6 (1.5, 0) -> (1.5, -1.5)
  line L7 (1.5, -1.5) -> (0, -1.5)
  line L8 (0, -1.5) -> (0, 0)
  line L9 (-3, -4) -> (-4.5, -4)
  line L10 (-4.5, -4) -> (-4.5, -2.5)
  line L11 (-4.5, -2.5) -> (-3, -2.5)
  line L12 (-3, -2.5) -> (-3, -4)
  line L13 (0, -4) -> (1.5, -4)
  line L14 (1.5, -4) -> (1.5, -2.5)
  line L15 (1.5, -2.5) -> (0, -2.5)
  line L16 (0, -2.5) -> (0, -4)
  point P0 (-1.5, -5)
extrude "Extrusion29" cut sketch "Sketch31" against normal blind 10 contours A0 L0 L1
extrude "Extrusion30" cut sketch "Sketch31" against normal blind 10 contours A3 L9 L10
extrude "Extrusion31" cut sketch "Sketch31" against normal blind 10 contours A5 L14 L13
extrude "Extrusion32" cut sketch "Sketch31" against normal blind 10 contours L5 L6 A7
sketch "Sketch32" plane through (79.7, 6, 0) normal (0, 1, 0) x (1, 0, 0)
  point P0 (-79.7, 0)
sketch "Sketch33" plane through (10.009, 6, 0) normal (0, 1, 0) x (1, 0, 0)
  circle A0 centre (0, 0) radius 3.85
  point P0 (-10.009, 0)
extrude "Extrusion33" add sketch "Sketch33" against normal blind 6
sketch "Sketch34" plane through (10.009, 6, 0) normal (0, 1, 0) x (1, 0, 0)
  circle A0 centre (0, 0) radius 1.925
  point P0 (-10.009, 0)
  dimension "d85" = 3.85
extrude "Extrusion34" cut sketch "Sketch34" against normal blind 6
sketch "Sketch35" plane through (10.009, 6, 0) normal (0, 1, 0) x (1, 0, 0)
  point P0 (-10.009, 0)
sketch "Sketch36" plane through (79.7, 6, 0) normal (0, 1, 0) x (1, 0, 0)
  point P0 (-79.7, 0)
sketch "Sketch37" plane through (79.7, 6, 0) normal (0, 1, 0) x (1, 0, 0)
  point P0 (-79.7, 0)
sketch "Sketch38" plane through (10.009, 6, 0) normal (0, 1, 0) x (1, 0, 0)
  circle A0 centre (0, 0) radius 1.95
  point P0 (-10.009, 0)
  dimension "d89" = 3.9
extrude "Extrusion35" cut sketch "Sketch38" against normal blind 6
sketch "Sketch39" plane through (79.7, 6, 0) normal (0, 1, 0) x (1, 0, 0)
  point P0 (-79.7, 0)
sketch "Sketch40" plane through (79.7, 6, 0) normal (0, 1, 0) x (1, 0, 0)
  point P0 (-79.7, 0)
sketch "Sketch41" plane through (79.7, 6, 0) normal (0, 1, 0) x (1, 0, 0)
  point P0 (-79.7, 0)
sketch "Sketch42" plane through (79.7, 6, 0) normal (0, 1, 0) x (1, 0, 0)
  circle A0 centre (0, 0) radius 3
  arc A1 (-66.1452, -1.5) -> (-66.1452, 1.5) centre (-69.691, 0) ccw projected
  circle A2 centre (-69.691, 0) radius 3
  point P0 (-79.7, 0)
  dimension "d92" = 6
  dimension "d93" = 6
extrude "Extrusion36" cut sketch "Sketch42" against normal through all contours A0
extrude "Extrusion37" cut sketch "Sketch42" against normal through all contours A2
sketch "Sketch43" plane through (10.009, 0, 0) normal (0, -1, 0) x (1, 0, 0)
  circle A0 centre (0, 0) radius 3.85 projected
  line L0 (0, 3.85) -> (-5, 3.85)
  line L1 (-5, 3.85) -> (-5, -3.85)
  line L2 (-5, -3.85) -> (0, -3.85)
  line L3 (0, -3.85) -> (0, 3.85)
  line L4 (-5, 3.85) -> (-4.5, 3.85)
  line L5 (-4.5, 3.85) -> (-4.5, -3.85)
  line L6 (-4.5, -3.85) -> (-5, -3.85)
  line L7 (-5, -3.85) -> (-5, 3.85)
  point P0 (-10.009, 0)
  dimension "d98" = 5
  dimension "d99" = 0.5
extrude "Extrusion38" add sketch "Sketch43" against normal blind 1 contours L5 L2 L1 L0
sketch "Sketch44" plane through (5.009, 0, -3.85) normal (-1, 0, 0) x (0, 0, 1)
  point P0 (3.85, 0)
sketch "Sketch45" plane through (5.009, 0, -3.85) normal (-1, 0, 0) x (0, 0, 1)
  line L0 (7.7, 1) -> (0, 1) projected
  line L1 (0, 0) -> (7.7, 0) projected
  line L2 (0, 1) -> (7.7, 1)
  line L3 (7.7, 1) -> (7.7, 0)
  line L4 (7.7, 0) -> (0, 0)
  line L5 (0, 0) -> (0, 1)
  point P0 (3.85, 0)
extrude "Extrusion39" cut sketch "Sketch45" against normal through all
sketch "Sketch46" plane through (10.009, 6, 0) normal (0, 1, 0) x (1, 0, 0)
  circle A0 centre (0, 0) radius 3.85 projected
  line L0 (0, 3.85) -> (-5, 3.85)
  line L1 (-5, 3.85) -> (-5, -3.85)
  line L2 (-5, -3.85) -> (0, -3.85)
  line L3 (0, -3.85) -> (0, 3.85)
  line L4 (-5, 3.85) -> (-4.5, 3.85)
  line L5 (-4.5, 3.85) -> (-4.5, -3.85)
  line L6 (-4.5, -3.85) -> (-5, -3.85)
  line L7 (-5, -3.85) -> (-5, 3.85)
  point P0 (-10.009, 0)
  dimension "d104" = 5
  dimension "d105" = 0.5
extrude "Extrusion40" add sketch "Sketch46" against normal blind 1 contours L5 L2 L1 L0
sketch "Sketch47" plane through (5.009, 6, -3.85) normal (-1, 0, 0) x (0, 0, 1)
  line L0 (0, 0) -> (0, -1) projected
  line L1 (0, -1) -> (7.7, -1) projected
  line L2 (0, 0) -> (7.7, 0)
  line L3 (7.7, 0) -> (7.7, -1)
  line L4 (7.7, -1) -> (0, -1)
  line L5 (0, -1) -> (0, 0)
  point P0 (3.85, -6)
extrude "Extrusion41" cut sketch "Sketch47" against normal through all
sketch "Sketch48" plane through (12.422, 2.5, 3) normal (0, 0, 1) x (1, 0, 0)
  line L0 (1.1328, 2.5) -> (63.7322, 2.5) projected
  line L1 (1.1328, -1.5) -> (63.7322, -1.5) projected
  line L2 (63.7322, 2.5) -> (63.7322, -1.5)
  line L3 (63.7322, 2.5) -> (71.128, 2.5) projected
  line L4 (71.128, 2.5) -> (63.7322, -1.5)
  line L5 (63.7322, 2.5) -> (71.128, -1.5)
  line L6 (71.128, -1.5) -> (71.128, 2.5) projected
  circle A0 centre (67.4301, 0.5) radius 4.2041
  line L7 (67.4301, 0.5) -> (67.4301, -1.5)
  line L8 (64.278, -1.5) -> (70.278, -1.5) projected
  line L9 (70.278, 2.5) -> (70.278, -1.5) projected
  line L10 (71.128, 0.6263) -> (70.278, 0.6263)
  line L11 (63.7322, 0.5) -> (64.5822, 0.5)
  line L12 (64.5822, 2.5) -> (64.5822, -1.5)
  line L13 (70.278, 2.5) -> (70.278, -1.5)
  line L14 (64.5822, 2.5) -> (70.278, -1.5)
  line L15 (70.278, 2.5) -> (64.5822, -1.5)
  circle A1 centre (67.4301, 0.5) radius 3.48
  line L16 (63.7322, 2.5) -> (71.128, 2.5)
  point P0 (-12.422, -2.5)
  dimension "d110" = 4
  dimension "d111" = 0.85
extrude "Extrusion42" add sketch "Sketch48" against normal blind 6 contours A0 L3 A1
sketch "Sketch49" plane through (12.422, 2.5, 3) normal (0, 0, 1) x (1, 0, 0)
  line L0 (71.128, 2.5) -> (61.853, 2.5)
  line L1 (61.853, 2.5) -> (61.853, 6.3445)
  line L2 (61.853, 6.3445) -> (71.128, 6.3445)
  line L3 (71.128, 6.3445) -> (71.128, 2.5)
  point P0 (-12.422, -2.5)
extrude "Extrusion43" cut sketch "Sketch49" against normal through all
sketch "Sketch50" plane through (79.7, 5, 0) normal (0, 1, 0) x (1, 0, 0)
  arc A0 (-3.5458, -1.5) -> (-3.5458, 1.5) centre (0, 0) ccw projected
  line L0 (0, -3.85) -> (3.85, -3.85)
  circle A1 centre (0, 0) radius 3.85
  line L1 (0, 3.85) -> (-3.85, 3.85)
  line L2 (-3.85, 3.85) -> (3.85, 3.85)
  line L3 (3.85, 3.85) -> (3.85, -3.85)
  line L4 (3.85, -3.85) -> (-3.85, -3.85)
  line L5 (-3.85, -3.85) -> (-3.85, 3.85)
  circle A2 centre (-69.691, 0) radius 3 projected
  arc A3 (-66.1452, 1.5) -> (-66.1452, -1.5) centre (-69.691, 0) ccw projected
  circle A4 centre (-69.691, 0) radius 3.85
  line L6 (-69.691, 3.85) -> (-73.541, 3.85)
  line L7 (-73.541, 3.85) -> (-65.841, 3.85)
  line L8 (-65.841, 3.85) -> (-65.841, -3.85)
  line L9 (-65.841, -3.85) -> (-73.541, -3.85)
  line L10 (-73.541, -3.85) -> (-73.541, 3.85)
  point P0 (-79.7, 0)
  point P1 (-3.85, 0)
  point P2 (-3.5458, -1.5)
  point P3 (-3.5458, 1.5)
  point P4 (-69.691, -3.85)
  point P5 (-65.841, 0)
  point P6 (-66.1452, -1.5)
extrude "Extrusion44" cut sketch "Sketch50" against normal blind 10 contours A0 L4 L5 A1
extrude "Extrusion45" cut sketch "Sketch50" against normal blind 10 contours L5 L1 A0 A1
extrude "Extrusion46" cut sketch "Sketch50" against normal blind 10 contours A1 A0
extrude "Extrusion47" cut sketch "Sketch50" against normal blind 10 contours L8 L9 A3 A4
extrude "Extrusion48" cut sketch "Sketch50" against normal blind 10 contours A3 L7 L8 A4
extrude "Extrusion49" cut sketch "Sketch50" against normal blind 10 contours A4 A3
sketch "Sketch51" plane through (75.85, 5, 1.5) normal (1, 0, 0) x (0, 0, -1)
  line L0 (-1.5, 0) -> (4.5, 0)
  line L1 (4.5, 0) -> (4.5, -5)
  line L2 (4.5, -5) -> (-1.5, -5)
  line L3 (-1.5, -5) -> (-1.5, 0)
  line L4 (-1.5, 0) -> (4.5, 0)
  line L5 (4.5, 0) -> (4.5, 1)
  line L6 (4.5, 1) -> (-1.5, 1)
  line L7 (-1.5, 1) -> (-1.5, 0)
  point P0 (1.5, -5)
  point P1 (4.5, 0)
  dimension "d128" = 5
  dimension "d129" = 1
extrude "Extrusion50" add sketch "Sketch51" along normal blind 5 contours L0 L1 L2 L3
extrude "Extrusion51" add sketch "Sketch51" along normal blind 5 contours L7 L6 L5 L0
sketch "Sketch52" plane through (13.859, 5, -1.5) normal (-1, 0, 0) x (0, 0, 1)
  line L0 (-1.5, -5) -> (-1.5, 1) projected
  line L1 (4.5, -5) -> (-1.5, -5) projected
  line L2 (-1.5, 1) -> (4.5, 1)
  line L3 (4.5, 1) -> (4.5, -5)
  line L4 (4.5, -5) -> (-1.5, -5)
  line L5 (-1.5, -5) -> (-1.5, 1)
  point P0 (1.5, -5)
extrude "Extrusion52" add sketch "Sketch52" along normal blind 5
sketch "Sketch53" plane through (13.859, 5, -1.5) normal (1, 0, 0) x (0, 0, -1)
  line L0 (-4.5, 1) -> (-4.5, -1.5) projected
  line L1 (1.5, -5) -> (1.5, -2.5) projected
  line L2 (-4.5, 1) -> (1.5, 1)
  line L3 (1.5, 1) -> (1.5, -5)
  line L4 (1.5, -5) -> (-4.5, -5)
  line L5 (-4.5, -5) -> (-4.5, 1)
  point P0 (-1.5, -5)
extrude "Extrusion53" add sketch "Sketch53" along normal blind 2
sketch "Sketch54" plane through (75.85, 5, 1.5) normal (-1, 0, 0) x (0, 0, 1)
  line L0 (-4.5, -5) -> (1.5, -5) projected
  line L1 (1.5, 1) -> (-4.5, 1) projected
  line L2 (-4.5, -5) -> (1.5, -5)
  line L3 (1.5, -5) -> (1.5, 1)
  line L4 (1.5, 1) -> (-4.5, 1)
  line L5 (-4.5, 1) -> (-4.5, -5)
  point P0 (-1.5, -5)
extrude "Extrusion54" add sketch "Sketch54" along normal blind 2
sketch "Sketch55" plane through (80.85, 5, 1.5) normal (1, 0, 0) x (0, 0, -1)
  circle A0 centre (1.5, -2) radius 1.95
  point P0 (1.5, -5)
  dimension "d140" = 3.9
extrude "Extrusion55" cut sketch "Sketch55" against normal blind 6
sketch "Sketch56" plane through (8.859, 5, -1.5) normal (-1, 0, 0) x (0, 0, 1)
  circle A0 centre (1.5, -2) radius 1.95
  point P0 (1.5, -5)
  dimension "d143" = 3.9
extrude "Extrusion56" cut sketch "Sketch56" against normal blind 6
fillet "Fillet5" radius 2 4 edges at (12.359, 6, 3) (12.359, 0, 3) (12.359, 6, -3) (12.359, 0, -3)
fillet "Fillet6" radius 2 4 edges at (77.35, 6, 3) (77.35, 6, -3) (77.35, 0, -3) (77.35, 0, 3)
properties part number "Part3_3DPrint"
